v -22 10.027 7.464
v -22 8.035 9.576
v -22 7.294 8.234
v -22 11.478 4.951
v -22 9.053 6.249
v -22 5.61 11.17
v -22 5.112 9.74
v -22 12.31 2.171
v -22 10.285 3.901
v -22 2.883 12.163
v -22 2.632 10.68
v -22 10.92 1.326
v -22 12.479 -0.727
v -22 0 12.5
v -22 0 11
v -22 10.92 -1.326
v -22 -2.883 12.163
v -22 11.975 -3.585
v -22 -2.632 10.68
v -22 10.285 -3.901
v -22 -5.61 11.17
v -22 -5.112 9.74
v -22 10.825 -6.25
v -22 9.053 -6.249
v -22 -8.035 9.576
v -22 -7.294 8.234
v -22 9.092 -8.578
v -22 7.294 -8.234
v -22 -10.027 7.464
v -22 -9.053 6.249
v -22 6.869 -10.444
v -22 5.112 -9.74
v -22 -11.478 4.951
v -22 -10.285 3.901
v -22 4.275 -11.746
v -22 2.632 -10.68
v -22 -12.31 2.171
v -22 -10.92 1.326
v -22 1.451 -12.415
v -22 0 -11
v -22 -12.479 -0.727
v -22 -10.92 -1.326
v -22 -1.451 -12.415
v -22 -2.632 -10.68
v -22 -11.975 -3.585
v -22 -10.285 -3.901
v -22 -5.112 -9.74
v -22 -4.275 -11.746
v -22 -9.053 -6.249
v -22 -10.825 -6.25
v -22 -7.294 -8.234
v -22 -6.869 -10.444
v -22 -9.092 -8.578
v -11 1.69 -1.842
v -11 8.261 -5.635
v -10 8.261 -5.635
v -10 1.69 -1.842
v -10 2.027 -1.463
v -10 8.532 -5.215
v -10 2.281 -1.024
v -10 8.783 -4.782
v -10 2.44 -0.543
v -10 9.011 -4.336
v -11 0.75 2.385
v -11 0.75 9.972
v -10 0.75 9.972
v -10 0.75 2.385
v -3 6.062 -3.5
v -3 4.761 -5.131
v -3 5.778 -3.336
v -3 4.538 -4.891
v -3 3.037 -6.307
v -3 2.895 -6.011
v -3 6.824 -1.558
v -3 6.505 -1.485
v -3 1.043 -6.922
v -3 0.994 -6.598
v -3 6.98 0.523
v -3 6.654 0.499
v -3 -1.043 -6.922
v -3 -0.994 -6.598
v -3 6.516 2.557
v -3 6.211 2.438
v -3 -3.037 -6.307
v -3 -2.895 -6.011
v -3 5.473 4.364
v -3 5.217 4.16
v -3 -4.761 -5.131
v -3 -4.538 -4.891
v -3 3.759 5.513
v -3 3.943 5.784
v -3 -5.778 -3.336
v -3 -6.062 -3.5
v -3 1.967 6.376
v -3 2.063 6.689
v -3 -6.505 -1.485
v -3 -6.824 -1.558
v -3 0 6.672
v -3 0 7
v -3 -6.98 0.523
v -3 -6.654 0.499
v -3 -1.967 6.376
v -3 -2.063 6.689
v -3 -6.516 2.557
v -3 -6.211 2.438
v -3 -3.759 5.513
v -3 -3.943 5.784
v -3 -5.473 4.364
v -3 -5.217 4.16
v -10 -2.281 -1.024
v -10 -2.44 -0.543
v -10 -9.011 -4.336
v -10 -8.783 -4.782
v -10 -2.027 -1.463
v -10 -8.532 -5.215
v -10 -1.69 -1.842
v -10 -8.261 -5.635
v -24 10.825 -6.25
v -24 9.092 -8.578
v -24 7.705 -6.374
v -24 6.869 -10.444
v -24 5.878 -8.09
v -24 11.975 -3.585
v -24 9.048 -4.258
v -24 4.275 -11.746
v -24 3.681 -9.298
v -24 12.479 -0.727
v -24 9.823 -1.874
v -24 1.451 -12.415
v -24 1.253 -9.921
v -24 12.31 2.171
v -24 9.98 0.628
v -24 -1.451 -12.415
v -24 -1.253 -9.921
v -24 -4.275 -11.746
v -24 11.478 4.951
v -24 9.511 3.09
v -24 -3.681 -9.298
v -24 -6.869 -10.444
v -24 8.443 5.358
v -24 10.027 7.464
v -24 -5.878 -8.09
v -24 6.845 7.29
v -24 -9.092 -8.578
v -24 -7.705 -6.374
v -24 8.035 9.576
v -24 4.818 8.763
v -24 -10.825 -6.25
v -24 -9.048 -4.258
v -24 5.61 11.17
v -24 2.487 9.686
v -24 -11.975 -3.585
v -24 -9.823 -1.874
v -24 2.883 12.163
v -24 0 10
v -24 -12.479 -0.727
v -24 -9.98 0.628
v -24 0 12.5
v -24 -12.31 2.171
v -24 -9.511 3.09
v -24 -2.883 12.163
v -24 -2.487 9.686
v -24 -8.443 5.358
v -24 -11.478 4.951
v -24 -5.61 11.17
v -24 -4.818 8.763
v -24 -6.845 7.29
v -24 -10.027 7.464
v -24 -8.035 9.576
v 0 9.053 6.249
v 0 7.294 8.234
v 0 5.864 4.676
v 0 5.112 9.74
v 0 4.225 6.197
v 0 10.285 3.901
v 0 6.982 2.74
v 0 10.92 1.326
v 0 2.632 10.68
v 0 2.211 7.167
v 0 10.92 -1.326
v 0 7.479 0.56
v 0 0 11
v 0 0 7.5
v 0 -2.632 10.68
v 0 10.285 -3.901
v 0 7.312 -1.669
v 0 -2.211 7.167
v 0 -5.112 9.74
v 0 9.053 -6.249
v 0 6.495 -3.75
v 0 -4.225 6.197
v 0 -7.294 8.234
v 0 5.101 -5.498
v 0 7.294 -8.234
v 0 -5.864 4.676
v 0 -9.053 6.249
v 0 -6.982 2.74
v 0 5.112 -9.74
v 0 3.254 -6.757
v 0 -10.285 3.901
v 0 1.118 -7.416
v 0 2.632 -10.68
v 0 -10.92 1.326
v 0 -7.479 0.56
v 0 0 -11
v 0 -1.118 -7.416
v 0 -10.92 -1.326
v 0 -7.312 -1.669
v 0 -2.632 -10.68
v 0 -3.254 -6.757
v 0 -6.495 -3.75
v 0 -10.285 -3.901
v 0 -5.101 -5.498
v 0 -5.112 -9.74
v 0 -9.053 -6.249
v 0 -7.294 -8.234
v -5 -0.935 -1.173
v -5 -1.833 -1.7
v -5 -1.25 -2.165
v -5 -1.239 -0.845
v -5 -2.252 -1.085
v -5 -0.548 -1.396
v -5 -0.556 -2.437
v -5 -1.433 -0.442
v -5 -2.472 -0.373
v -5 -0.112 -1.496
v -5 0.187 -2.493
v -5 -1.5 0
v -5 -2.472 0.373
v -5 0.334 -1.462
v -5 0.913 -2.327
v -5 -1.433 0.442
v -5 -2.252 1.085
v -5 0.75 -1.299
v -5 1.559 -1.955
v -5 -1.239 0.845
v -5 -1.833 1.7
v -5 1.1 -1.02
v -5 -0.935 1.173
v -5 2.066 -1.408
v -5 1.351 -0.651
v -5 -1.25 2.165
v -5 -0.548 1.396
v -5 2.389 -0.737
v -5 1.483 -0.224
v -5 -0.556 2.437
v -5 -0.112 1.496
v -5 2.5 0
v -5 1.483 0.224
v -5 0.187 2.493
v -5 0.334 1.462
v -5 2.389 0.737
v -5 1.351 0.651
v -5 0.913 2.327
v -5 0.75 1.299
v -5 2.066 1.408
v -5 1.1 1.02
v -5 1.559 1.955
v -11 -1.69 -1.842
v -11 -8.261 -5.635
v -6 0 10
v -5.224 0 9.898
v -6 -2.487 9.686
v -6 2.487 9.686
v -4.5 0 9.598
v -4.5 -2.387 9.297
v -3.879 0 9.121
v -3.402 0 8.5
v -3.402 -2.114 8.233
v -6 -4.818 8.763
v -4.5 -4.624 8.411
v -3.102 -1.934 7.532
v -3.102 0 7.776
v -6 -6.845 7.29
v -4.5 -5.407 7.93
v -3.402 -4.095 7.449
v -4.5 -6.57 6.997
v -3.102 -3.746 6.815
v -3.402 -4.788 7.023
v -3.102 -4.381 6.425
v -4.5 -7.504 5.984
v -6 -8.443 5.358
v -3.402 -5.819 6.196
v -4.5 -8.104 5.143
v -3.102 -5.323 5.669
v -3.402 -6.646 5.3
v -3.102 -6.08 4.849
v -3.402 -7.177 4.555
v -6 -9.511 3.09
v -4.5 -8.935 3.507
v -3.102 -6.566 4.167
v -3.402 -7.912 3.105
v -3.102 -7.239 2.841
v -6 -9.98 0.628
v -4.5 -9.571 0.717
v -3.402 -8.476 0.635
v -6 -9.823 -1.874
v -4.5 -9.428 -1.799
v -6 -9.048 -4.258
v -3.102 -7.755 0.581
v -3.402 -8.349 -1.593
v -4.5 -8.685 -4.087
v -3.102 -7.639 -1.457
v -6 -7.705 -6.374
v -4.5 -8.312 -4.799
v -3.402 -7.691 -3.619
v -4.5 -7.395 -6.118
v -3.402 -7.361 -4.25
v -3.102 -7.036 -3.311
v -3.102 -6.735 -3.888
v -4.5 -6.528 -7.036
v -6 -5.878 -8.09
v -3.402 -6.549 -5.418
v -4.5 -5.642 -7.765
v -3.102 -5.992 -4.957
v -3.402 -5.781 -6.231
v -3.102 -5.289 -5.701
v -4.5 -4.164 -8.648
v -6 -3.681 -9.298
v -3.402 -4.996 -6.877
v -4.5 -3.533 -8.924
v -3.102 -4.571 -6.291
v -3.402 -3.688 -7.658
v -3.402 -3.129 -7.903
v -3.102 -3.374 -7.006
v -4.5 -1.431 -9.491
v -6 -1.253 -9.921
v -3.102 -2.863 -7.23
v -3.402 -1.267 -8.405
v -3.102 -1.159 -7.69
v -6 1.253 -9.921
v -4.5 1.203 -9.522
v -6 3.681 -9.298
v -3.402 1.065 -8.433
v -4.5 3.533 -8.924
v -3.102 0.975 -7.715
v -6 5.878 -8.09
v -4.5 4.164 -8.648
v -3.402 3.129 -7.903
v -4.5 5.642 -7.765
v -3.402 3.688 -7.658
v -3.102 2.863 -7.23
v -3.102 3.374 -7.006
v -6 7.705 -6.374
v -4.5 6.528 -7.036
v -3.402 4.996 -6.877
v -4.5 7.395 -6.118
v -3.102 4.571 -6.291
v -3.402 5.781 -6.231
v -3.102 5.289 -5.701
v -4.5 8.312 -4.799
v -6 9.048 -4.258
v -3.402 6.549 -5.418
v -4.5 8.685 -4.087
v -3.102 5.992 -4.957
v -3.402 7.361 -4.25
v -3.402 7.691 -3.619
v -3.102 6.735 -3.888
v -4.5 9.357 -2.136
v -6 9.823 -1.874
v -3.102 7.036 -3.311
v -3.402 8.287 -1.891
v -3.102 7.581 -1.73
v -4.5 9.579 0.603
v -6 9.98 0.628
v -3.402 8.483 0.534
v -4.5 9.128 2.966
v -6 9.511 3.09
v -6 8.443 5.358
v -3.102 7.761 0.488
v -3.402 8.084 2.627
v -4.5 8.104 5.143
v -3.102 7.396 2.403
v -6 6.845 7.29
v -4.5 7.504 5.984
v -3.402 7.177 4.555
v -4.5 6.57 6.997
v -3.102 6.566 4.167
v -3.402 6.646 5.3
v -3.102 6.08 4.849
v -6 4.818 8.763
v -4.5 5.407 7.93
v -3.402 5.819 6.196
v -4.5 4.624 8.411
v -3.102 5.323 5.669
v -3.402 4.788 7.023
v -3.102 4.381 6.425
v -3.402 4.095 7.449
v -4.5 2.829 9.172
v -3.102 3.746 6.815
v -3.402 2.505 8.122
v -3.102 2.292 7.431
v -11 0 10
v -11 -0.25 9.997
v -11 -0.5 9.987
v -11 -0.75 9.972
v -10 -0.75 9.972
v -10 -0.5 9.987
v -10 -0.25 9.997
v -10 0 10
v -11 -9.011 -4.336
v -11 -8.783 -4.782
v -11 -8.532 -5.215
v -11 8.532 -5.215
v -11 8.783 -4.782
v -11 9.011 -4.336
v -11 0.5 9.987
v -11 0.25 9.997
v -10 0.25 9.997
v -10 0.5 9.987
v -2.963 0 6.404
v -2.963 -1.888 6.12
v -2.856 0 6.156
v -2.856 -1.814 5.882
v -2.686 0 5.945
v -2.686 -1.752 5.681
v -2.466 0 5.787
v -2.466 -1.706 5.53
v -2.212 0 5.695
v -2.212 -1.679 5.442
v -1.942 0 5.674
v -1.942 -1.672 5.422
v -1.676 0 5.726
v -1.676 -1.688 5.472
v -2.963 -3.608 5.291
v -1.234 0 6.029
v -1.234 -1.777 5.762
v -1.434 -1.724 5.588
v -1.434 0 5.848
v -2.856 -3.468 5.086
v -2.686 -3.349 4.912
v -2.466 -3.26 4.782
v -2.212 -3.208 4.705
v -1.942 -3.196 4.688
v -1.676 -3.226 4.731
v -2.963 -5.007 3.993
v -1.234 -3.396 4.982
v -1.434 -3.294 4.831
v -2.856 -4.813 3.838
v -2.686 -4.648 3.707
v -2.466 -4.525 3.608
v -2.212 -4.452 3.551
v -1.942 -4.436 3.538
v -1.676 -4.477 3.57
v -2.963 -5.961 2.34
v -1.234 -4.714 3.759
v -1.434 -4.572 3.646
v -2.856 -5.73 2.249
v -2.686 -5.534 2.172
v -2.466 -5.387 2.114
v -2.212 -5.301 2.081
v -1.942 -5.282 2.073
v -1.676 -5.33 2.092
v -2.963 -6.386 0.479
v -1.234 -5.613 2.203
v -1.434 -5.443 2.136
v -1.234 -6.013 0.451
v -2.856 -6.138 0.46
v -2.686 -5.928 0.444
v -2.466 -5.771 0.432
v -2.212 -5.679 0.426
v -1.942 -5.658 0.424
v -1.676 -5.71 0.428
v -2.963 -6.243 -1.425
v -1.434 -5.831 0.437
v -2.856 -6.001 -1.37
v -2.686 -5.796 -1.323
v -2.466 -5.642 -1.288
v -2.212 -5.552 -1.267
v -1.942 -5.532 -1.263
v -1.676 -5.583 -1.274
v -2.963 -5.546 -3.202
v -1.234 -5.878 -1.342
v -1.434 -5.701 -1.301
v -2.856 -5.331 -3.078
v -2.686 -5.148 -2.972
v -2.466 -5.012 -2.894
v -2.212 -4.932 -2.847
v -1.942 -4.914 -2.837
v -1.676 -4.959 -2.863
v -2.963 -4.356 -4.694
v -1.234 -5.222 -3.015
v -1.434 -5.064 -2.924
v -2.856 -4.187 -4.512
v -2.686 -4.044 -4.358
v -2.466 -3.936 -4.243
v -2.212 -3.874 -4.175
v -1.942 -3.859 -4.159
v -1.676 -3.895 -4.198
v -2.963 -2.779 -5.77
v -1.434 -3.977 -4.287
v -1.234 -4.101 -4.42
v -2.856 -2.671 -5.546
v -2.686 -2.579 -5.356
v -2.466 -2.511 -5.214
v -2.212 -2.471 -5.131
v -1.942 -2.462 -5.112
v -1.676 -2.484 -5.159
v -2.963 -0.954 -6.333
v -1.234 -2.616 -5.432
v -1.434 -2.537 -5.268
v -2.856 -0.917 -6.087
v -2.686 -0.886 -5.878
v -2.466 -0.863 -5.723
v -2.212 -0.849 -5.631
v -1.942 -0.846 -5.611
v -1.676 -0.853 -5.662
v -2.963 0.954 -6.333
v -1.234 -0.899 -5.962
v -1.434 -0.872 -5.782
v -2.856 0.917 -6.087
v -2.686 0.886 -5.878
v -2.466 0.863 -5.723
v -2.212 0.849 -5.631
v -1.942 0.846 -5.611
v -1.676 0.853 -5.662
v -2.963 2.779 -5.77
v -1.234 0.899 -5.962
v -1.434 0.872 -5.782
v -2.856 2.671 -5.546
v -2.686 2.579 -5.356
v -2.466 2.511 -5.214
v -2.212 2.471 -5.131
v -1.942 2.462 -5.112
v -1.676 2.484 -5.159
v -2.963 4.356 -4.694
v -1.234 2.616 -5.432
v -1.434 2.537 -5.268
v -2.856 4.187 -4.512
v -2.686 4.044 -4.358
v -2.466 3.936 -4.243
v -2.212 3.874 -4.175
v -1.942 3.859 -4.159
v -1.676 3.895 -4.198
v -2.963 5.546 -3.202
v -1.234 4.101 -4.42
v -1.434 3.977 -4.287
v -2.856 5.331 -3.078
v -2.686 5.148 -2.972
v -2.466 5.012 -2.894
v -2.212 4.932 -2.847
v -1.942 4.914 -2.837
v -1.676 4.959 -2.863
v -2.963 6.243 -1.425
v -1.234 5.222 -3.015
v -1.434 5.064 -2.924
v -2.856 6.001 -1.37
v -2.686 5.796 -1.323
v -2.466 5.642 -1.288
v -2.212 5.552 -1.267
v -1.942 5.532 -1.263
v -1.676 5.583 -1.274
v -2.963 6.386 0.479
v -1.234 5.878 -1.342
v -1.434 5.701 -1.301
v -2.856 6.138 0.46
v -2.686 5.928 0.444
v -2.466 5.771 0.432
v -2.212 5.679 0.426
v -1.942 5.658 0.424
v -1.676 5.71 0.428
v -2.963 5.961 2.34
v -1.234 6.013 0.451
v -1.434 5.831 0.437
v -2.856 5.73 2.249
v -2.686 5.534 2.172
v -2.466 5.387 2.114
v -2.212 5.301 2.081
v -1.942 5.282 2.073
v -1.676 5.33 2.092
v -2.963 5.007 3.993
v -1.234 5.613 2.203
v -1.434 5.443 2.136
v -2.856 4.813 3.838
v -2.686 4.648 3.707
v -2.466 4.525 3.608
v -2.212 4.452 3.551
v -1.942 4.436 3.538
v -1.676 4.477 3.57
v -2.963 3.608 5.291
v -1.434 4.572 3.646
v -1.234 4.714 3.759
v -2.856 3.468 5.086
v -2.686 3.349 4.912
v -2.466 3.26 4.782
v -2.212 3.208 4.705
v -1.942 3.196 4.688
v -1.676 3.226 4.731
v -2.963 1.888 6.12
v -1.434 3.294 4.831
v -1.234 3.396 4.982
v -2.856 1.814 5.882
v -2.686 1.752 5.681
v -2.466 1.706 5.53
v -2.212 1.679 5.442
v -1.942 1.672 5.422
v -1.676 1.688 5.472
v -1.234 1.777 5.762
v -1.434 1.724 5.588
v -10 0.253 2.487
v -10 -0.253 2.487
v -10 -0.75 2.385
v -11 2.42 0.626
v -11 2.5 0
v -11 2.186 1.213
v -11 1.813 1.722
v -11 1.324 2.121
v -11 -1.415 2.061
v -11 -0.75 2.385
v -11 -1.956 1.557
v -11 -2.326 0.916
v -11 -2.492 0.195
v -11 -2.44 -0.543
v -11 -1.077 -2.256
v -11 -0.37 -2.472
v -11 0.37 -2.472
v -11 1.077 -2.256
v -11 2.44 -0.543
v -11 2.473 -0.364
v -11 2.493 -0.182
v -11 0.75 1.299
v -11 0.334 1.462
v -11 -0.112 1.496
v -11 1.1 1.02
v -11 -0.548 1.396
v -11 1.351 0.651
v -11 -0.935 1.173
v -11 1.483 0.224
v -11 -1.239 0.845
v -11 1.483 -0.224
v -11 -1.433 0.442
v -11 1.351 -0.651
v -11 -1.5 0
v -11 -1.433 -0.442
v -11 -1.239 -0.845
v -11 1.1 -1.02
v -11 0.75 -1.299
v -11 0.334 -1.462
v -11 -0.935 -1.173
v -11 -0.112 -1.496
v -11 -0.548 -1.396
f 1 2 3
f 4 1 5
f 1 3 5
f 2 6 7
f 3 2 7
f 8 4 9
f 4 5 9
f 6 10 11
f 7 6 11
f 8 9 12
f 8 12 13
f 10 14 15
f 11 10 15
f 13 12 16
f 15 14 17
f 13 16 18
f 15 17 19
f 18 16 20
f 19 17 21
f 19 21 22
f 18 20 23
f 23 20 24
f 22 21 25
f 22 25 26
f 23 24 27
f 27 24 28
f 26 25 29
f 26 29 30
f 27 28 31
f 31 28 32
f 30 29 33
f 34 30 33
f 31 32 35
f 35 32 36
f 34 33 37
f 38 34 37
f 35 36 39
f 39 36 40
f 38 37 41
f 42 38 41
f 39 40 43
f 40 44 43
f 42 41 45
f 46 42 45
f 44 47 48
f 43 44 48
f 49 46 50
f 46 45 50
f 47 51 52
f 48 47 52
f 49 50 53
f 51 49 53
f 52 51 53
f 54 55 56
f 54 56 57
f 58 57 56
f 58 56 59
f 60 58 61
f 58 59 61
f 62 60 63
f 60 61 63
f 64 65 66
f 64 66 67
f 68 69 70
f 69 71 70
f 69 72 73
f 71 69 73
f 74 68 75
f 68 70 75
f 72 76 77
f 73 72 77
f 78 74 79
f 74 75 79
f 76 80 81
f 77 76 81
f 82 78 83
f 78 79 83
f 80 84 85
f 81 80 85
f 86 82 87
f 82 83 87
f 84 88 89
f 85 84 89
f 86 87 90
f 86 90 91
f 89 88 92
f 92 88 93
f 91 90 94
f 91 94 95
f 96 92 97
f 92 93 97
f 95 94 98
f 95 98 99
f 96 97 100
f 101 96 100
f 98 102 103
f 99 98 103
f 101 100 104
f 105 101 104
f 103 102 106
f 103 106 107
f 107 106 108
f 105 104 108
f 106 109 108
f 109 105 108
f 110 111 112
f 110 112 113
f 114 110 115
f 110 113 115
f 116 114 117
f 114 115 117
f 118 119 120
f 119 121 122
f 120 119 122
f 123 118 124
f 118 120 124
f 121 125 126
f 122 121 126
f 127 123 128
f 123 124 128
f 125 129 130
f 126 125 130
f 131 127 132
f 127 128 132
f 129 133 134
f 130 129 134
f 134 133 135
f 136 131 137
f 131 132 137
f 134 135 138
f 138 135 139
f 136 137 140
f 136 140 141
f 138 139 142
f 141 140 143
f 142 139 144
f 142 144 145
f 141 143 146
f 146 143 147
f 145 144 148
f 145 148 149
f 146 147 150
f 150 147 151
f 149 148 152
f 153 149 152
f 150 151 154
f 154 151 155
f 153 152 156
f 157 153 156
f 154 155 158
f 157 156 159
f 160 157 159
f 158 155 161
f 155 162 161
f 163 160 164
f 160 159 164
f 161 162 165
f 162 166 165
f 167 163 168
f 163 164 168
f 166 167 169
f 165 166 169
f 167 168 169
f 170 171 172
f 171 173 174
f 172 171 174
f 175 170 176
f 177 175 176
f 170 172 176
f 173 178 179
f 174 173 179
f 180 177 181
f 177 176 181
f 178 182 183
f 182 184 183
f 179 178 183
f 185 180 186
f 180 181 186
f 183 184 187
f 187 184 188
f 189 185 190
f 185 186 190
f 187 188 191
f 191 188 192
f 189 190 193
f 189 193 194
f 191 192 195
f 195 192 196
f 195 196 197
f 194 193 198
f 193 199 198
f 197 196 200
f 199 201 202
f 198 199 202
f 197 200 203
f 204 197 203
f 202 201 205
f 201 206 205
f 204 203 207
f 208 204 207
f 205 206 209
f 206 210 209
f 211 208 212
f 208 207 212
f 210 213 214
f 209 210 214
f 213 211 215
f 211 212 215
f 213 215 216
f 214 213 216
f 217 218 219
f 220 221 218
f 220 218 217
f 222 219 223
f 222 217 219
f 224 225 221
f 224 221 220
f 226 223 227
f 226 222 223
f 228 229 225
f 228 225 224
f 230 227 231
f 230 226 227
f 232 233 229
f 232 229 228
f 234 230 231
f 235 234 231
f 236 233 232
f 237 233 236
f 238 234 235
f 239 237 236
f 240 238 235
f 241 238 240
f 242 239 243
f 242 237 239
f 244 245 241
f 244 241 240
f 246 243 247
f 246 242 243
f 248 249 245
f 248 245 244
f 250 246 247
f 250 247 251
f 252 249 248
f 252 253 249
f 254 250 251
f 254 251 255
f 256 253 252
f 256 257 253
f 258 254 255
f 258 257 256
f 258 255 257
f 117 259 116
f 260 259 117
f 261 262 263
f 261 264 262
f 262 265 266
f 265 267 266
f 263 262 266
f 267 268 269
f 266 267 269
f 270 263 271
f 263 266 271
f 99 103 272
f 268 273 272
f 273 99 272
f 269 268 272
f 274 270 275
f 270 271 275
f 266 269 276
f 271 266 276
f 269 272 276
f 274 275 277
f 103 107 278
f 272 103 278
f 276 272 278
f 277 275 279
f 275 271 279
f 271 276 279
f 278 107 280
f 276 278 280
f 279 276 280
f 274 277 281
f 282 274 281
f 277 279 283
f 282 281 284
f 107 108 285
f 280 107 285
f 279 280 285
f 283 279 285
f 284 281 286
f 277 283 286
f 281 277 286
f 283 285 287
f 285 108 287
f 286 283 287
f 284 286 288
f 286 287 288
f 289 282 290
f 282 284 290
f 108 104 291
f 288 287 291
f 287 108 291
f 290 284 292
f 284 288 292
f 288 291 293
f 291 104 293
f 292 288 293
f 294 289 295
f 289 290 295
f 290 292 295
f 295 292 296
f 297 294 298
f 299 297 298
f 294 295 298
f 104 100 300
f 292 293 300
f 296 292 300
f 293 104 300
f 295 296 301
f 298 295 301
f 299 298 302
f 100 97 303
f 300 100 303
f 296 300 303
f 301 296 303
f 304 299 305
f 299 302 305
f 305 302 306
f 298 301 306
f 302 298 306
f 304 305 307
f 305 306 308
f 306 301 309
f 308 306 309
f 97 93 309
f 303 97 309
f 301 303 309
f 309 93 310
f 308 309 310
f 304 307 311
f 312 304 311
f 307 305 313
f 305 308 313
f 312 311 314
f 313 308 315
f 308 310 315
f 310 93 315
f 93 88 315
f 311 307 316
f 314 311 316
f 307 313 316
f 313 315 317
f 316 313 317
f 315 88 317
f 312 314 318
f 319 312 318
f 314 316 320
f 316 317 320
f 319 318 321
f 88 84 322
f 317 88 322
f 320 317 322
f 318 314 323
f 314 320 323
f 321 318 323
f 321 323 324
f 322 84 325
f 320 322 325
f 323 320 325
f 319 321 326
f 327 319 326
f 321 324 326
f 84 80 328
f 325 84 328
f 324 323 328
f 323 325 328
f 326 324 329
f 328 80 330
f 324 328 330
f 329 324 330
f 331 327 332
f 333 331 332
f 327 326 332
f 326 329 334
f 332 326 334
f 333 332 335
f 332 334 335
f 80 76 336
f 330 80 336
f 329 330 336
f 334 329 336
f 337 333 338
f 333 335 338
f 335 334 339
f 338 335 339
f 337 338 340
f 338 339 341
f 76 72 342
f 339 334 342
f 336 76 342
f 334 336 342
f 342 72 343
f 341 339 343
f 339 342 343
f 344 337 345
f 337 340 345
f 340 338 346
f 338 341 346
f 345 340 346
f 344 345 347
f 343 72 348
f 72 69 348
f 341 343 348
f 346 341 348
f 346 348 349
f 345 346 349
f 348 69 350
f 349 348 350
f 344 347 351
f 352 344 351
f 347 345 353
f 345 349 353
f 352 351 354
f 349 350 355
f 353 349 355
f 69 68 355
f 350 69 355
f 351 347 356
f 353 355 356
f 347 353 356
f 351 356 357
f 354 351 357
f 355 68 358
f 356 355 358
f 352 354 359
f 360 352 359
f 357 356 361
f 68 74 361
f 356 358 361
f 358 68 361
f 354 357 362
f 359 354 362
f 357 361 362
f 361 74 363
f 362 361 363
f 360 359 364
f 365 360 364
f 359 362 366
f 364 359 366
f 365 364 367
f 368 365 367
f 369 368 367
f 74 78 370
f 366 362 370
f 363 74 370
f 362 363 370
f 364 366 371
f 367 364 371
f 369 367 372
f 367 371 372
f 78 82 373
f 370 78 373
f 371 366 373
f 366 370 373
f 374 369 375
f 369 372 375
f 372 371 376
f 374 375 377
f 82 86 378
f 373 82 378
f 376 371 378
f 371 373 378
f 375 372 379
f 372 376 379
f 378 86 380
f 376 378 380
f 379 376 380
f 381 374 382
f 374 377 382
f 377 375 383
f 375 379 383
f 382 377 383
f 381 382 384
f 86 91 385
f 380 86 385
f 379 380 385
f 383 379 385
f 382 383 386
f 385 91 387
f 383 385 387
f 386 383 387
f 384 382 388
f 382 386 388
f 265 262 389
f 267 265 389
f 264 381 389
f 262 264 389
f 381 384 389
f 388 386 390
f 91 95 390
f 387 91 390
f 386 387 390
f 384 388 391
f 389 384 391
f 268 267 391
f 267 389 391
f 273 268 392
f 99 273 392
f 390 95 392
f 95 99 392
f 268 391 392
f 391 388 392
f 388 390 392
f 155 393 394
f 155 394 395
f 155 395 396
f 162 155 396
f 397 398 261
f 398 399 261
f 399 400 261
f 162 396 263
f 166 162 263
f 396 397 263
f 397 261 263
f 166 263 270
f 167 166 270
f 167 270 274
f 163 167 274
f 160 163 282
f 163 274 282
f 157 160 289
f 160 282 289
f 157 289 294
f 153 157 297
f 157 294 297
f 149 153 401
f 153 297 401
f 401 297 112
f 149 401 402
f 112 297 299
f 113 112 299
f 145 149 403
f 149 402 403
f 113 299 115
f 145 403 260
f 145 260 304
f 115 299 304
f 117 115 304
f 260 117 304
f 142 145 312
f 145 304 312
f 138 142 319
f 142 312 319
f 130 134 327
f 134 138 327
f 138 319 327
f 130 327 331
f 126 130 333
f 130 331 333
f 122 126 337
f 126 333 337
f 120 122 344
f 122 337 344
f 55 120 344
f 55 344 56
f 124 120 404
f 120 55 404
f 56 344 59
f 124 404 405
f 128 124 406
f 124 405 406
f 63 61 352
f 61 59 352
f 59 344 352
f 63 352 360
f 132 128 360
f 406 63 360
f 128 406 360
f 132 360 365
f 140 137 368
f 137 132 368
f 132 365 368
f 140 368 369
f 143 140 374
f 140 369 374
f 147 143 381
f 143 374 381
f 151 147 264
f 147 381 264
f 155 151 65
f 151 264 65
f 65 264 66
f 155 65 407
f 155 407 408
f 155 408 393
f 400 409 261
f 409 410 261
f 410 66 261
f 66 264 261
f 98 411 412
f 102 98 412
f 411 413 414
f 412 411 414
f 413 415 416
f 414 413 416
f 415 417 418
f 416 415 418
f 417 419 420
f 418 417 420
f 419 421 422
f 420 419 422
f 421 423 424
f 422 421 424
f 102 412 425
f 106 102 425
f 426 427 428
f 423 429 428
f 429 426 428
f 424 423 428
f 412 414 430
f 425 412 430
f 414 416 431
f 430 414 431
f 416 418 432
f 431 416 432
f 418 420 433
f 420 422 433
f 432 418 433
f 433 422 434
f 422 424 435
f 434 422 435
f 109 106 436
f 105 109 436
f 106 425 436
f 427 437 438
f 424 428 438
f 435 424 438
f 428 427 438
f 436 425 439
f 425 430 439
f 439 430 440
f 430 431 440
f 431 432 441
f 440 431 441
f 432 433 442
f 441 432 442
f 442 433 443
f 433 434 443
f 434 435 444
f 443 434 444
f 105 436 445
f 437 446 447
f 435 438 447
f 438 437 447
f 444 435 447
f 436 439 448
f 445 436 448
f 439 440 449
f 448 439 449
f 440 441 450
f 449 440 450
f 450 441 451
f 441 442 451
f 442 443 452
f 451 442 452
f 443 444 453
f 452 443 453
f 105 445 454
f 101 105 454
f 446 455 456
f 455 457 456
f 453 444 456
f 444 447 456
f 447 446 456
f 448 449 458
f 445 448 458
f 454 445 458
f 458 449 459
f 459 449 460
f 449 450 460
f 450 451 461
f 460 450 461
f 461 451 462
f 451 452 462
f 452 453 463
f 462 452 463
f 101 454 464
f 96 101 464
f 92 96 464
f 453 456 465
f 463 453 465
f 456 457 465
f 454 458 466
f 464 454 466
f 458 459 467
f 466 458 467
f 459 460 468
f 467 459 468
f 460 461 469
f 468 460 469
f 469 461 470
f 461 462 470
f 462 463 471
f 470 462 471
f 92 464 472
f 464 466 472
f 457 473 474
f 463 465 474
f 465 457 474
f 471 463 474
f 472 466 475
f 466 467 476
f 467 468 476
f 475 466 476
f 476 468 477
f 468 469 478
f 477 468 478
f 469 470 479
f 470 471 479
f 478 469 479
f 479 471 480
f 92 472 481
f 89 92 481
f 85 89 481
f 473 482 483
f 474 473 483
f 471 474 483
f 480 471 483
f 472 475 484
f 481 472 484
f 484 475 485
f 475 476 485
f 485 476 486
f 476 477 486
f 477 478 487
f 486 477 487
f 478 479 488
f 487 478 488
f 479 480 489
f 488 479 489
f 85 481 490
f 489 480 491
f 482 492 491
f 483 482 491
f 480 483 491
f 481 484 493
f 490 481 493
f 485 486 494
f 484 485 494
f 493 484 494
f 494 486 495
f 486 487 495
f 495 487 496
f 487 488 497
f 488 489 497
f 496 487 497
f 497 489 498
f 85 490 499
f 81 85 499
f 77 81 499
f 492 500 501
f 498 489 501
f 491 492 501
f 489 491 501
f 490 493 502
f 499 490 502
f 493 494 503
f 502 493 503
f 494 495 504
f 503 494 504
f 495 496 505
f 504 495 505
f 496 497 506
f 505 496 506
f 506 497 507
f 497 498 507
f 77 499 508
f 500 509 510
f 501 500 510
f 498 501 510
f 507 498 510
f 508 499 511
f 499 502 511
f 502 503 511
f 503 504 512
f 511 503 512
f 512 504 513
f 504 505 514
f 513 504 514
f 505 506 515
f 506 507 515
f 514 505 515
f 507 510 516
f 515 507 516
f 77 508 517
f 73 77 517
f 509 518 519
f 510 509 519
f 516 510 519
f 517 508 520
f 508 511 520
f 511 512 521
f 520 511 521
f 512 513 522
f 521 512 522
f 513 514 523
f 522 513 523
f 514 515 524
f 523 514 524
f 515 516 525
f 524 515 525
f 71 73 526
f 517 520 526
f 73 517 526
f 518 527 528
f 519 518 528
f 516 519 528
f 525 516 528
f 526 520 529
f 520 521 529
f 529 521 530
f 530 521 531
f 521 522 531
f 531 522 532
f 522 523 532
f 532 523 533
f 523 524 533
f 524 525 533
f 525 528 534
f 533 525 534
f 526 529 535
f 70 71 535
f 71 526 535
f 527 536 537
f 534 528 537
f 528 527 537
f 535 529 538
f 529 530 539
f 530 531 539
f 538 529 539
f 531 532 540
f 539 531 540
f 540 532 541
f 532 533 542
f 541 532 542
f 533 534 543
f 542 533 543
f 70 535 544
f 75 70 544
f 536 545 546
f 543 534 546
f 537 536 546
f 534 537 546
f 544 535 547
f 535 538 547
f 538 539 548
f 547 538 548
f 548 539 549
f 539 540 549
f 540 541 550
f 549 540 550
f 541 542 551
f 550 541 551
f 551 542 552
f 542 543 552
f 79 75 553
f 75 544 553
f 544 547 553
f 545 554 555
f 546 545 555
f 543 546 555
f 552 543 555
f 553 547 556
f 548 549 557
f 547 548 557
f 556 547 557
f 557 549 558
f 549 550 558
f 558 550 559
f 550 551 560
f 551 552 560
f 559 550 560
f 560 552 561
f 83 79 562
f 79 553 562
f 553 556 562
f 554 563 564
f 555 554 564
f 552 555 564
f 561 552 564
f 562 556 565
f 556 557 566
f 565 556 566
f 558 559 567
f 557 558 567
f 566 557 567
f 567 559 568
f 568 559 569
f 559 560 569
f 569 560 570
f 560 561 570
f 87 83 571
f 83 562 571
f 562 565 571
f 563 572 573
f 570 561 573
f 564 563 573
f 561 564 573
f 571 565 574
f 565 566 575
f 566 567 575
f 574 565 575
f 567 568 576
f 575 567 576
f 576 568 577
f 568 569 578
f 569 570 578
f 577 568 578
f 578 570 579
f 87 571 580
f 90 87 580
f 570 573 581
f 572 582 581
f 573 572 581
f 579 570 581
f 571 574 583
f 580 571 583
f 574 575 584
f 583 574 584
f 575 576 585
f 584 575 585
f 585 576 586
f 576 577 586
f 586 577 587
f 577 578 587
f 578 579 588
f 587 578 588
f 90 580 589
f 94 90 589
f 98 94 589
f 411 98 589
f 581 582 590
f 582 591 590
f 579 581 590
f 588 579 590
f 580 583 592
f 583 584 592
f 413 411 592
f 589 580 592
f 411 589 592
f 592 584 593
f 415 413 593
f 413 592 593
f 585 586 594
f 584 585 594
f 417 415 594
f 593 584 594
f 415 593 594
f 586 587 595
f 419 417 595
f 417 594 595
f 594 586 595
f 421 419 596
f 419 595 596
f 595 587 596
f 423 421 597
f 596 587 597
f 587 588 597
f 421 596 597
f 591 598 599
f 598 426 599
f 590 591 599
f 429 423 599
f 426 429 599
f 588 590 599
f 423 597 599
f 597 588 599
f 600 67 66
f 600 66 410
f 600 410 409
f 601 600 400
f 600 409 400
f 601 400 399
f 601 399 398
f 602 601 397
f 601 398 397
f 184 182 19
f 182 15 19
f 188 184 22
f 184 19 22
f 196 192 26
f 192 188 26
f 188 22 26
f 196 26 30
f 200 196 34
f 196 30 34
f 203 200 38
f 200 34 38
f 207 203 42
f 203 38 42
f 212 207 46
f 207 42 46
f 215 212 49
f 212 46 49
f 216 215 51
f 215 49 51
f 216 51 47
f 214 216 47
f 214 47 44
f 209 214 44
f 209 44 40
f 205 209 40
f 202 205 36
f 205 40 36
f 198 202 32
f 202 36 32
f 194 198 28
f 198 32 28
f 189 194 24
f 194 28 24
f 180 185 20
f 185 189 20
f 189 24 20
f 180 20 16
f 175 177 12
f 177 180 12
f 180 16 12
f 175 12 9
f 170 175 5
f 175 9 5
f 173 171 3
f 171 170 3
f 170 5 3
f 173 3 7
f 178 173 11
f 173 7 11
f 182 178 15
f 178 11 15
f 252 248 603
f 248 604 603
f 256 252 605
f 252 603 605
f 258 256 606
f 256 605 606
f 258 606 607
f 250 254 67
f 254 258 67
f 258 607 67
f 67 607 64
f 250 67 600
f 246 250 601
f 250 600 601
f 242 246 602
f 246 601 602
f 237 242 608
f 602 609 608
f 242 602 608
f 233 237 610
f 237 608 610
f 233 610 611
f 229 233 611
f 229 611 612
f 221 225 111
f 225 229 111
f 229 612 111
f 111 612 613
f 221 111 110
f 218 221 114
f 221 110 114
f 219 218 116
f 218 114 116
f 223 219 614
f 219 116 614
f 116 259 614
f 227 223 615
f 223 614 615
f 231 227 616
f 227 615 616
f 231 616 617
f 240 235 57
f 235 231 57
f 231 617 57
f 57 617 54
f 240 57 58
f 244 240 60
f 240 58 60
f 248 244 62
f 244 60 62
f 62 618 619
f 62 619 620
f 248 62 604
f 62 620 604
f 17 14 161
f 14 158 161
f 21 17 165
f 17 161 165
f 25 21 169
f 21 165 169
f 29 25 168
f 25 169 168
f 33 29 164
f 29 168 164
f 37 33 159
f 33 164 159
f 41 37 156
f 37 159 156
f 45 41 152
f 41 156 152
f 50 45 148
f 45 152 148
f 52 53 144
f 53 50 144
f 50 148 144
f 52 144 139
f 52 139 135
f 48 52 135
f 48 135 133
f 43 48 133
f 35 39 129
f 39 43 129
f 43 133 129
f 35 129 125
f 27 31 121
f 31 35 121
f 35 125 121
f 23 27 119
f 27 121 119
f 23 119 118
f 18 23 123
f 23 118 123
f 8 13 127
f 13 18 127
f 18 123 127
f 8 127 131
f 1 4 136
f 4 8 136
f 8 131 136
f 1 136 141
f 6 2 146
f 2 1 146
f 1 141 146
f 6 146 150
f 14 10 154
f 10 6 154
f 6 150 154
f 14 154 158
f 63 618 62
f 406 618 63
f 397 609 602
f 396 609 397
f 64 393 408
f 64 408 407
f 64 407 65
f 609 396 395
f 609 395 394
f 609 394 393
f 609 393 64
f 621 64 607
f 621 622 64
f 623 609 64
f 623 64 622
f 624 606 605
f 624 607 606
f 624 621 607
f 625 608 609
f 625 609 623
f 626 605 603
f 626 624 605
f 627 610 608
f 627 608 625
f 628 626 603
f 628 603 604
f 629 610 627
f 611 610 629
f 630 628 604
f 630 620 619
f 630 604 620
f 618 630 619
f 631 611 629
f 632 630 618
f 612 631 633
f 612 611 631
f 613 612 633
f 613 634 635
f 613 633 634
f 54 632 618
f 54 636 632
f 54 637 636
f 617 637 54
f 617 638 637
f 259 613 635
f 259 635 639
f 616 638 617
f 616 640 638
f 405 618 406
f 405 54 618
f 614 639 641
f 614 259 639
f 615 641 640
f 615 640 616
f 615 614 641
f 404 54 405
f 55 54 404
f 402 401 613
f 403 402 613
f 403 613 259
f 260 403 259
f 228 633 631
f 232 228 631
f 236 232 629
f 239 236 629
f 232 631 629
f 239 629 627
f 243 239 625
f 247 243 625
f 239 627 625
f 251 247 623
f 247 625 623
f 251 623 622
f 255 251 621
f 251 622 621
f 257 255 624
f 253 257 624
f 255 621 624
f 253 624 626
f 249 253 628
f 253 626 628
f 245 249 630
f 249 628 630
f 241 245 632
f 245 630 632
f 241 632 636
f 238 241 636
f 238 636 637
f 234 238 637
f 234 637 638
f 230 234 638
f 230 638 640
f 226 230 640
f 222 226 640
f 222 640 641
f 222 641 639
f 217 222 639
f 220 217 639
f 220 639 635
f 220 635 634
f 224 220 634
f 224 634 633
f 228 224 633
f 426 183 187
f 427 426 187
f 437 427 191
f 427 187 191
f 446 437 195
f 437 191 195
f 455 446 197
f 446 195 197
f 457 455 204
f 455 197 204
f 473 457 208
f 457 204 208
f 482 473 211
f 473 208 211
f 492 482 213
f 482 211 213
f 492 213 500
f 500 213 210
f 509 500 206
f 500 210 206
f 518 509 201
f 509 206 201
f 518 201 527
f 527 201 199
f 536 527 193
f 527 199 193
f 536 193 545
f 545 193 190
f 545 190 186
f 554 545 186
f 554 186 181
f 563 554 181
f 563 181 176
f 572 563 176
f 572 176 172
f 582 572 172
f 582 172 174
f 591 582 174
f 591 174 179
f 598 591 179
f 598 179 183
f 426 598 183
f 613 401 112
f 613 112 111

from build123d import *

# Parameters (mm, degrees)
F3_R      = 2.5
F4_DEPTH  = 6
F6_DEPTH  = 1
F7_COUNT  = 3
F9_R      = 1.5
F10_DEPTH = 25


with BuildPart() as f1:
    # F0 (on Front) → F1 (revolve)
    with BuildSketch(Plane.XZ):
        with BuildLine():
            Line((-24, 12.5), (-24, 10))
            Line((-24, 10), (-6, 10))
            ThreePointArc((-6, 10), (-3.8786796564, 9.1213203436), (-3, 7))
            Line((-3, 7), (-3, 6.6722166417))
            ThreePointArc((-3, 6.6722166417), (-2.3420201433, 5.7325240209), (-1.2339555569, 6.029429032))
            Line((-1.2339555569, 6.029429032), (0, 7.5))
            Line((0, 7.5), (0, 11))
            Line((0, 11), (-22, 11))
            Line((-22, 11), (-22, 12.5))
            Line((-22, 12.5), (-24, 12.5))
        make_face()
    revolve(axis=Axis((0, 0, 0), (1, 0, 0)))



with BuildPart() as f4:
    # F3 (on offset) → F4 (new body)
    with BuildSketch(Plane.YZ.offset(-11)):
        Circle(F3_R)
    extrude(amount=F4_DEPTH)


with BuildPart() as f1_1:
    add(f1.part)

    add(f4.part)  # F6 merges F4
    # F5 (on face) → F6 (join)
    with BuildSketch(Plane(origin=(-11, 0, 0), x_dir=(0, -1, 0), z_dir=(-1, 0, 0))):
        with BuildLine():
            Line((0.75, 2.3848480035), (0.75, 9.9718353376))
            ThreePointArc((0.75, 9.9718353376), (0, 10), (-0.75, 9.9718353376))
            Line((-0.75, 9.9718353376), (-0.75, 2.3848480035))
            ThreePointArc((-0.75, 2.3848480035), (0, 2.5), (0.75, 2.3848480035))
        make_face()
    extrude(amount=-F6_DEPTH)


with BuildPart() as f7_1:
    # F7: instance of F1
    add(f1_1.part.rotate(Axis((-11, 0, 0), (1, 0, 0)), 1 * 360 / F7_COUNT))


with BuildPart() as f7_2:
    # F7: instance of F1
    add(f1_1.part.rotate(Axis((-11, 0, 0), (1, 0, 0)), 2 * 360 / F7_COUNT))


with BuildPart() as f1_2:
    add(f1_1.part)

    # F8: union F7_2, F7_1
    add(f7_2.part)
    add(f7_1.part)

    # F9 (on face) → F10 (cut)
    with BuildSketch(Plane(origin=(-11, 0, 0), x_dir=(0, -1, 0), z_dir=(-1, 0, 0))):
        Circle(F9_R)
    extrude(amount=-F10_DEPTH, mode=Mode.SUBTRACT)


solid = f1_2.part
